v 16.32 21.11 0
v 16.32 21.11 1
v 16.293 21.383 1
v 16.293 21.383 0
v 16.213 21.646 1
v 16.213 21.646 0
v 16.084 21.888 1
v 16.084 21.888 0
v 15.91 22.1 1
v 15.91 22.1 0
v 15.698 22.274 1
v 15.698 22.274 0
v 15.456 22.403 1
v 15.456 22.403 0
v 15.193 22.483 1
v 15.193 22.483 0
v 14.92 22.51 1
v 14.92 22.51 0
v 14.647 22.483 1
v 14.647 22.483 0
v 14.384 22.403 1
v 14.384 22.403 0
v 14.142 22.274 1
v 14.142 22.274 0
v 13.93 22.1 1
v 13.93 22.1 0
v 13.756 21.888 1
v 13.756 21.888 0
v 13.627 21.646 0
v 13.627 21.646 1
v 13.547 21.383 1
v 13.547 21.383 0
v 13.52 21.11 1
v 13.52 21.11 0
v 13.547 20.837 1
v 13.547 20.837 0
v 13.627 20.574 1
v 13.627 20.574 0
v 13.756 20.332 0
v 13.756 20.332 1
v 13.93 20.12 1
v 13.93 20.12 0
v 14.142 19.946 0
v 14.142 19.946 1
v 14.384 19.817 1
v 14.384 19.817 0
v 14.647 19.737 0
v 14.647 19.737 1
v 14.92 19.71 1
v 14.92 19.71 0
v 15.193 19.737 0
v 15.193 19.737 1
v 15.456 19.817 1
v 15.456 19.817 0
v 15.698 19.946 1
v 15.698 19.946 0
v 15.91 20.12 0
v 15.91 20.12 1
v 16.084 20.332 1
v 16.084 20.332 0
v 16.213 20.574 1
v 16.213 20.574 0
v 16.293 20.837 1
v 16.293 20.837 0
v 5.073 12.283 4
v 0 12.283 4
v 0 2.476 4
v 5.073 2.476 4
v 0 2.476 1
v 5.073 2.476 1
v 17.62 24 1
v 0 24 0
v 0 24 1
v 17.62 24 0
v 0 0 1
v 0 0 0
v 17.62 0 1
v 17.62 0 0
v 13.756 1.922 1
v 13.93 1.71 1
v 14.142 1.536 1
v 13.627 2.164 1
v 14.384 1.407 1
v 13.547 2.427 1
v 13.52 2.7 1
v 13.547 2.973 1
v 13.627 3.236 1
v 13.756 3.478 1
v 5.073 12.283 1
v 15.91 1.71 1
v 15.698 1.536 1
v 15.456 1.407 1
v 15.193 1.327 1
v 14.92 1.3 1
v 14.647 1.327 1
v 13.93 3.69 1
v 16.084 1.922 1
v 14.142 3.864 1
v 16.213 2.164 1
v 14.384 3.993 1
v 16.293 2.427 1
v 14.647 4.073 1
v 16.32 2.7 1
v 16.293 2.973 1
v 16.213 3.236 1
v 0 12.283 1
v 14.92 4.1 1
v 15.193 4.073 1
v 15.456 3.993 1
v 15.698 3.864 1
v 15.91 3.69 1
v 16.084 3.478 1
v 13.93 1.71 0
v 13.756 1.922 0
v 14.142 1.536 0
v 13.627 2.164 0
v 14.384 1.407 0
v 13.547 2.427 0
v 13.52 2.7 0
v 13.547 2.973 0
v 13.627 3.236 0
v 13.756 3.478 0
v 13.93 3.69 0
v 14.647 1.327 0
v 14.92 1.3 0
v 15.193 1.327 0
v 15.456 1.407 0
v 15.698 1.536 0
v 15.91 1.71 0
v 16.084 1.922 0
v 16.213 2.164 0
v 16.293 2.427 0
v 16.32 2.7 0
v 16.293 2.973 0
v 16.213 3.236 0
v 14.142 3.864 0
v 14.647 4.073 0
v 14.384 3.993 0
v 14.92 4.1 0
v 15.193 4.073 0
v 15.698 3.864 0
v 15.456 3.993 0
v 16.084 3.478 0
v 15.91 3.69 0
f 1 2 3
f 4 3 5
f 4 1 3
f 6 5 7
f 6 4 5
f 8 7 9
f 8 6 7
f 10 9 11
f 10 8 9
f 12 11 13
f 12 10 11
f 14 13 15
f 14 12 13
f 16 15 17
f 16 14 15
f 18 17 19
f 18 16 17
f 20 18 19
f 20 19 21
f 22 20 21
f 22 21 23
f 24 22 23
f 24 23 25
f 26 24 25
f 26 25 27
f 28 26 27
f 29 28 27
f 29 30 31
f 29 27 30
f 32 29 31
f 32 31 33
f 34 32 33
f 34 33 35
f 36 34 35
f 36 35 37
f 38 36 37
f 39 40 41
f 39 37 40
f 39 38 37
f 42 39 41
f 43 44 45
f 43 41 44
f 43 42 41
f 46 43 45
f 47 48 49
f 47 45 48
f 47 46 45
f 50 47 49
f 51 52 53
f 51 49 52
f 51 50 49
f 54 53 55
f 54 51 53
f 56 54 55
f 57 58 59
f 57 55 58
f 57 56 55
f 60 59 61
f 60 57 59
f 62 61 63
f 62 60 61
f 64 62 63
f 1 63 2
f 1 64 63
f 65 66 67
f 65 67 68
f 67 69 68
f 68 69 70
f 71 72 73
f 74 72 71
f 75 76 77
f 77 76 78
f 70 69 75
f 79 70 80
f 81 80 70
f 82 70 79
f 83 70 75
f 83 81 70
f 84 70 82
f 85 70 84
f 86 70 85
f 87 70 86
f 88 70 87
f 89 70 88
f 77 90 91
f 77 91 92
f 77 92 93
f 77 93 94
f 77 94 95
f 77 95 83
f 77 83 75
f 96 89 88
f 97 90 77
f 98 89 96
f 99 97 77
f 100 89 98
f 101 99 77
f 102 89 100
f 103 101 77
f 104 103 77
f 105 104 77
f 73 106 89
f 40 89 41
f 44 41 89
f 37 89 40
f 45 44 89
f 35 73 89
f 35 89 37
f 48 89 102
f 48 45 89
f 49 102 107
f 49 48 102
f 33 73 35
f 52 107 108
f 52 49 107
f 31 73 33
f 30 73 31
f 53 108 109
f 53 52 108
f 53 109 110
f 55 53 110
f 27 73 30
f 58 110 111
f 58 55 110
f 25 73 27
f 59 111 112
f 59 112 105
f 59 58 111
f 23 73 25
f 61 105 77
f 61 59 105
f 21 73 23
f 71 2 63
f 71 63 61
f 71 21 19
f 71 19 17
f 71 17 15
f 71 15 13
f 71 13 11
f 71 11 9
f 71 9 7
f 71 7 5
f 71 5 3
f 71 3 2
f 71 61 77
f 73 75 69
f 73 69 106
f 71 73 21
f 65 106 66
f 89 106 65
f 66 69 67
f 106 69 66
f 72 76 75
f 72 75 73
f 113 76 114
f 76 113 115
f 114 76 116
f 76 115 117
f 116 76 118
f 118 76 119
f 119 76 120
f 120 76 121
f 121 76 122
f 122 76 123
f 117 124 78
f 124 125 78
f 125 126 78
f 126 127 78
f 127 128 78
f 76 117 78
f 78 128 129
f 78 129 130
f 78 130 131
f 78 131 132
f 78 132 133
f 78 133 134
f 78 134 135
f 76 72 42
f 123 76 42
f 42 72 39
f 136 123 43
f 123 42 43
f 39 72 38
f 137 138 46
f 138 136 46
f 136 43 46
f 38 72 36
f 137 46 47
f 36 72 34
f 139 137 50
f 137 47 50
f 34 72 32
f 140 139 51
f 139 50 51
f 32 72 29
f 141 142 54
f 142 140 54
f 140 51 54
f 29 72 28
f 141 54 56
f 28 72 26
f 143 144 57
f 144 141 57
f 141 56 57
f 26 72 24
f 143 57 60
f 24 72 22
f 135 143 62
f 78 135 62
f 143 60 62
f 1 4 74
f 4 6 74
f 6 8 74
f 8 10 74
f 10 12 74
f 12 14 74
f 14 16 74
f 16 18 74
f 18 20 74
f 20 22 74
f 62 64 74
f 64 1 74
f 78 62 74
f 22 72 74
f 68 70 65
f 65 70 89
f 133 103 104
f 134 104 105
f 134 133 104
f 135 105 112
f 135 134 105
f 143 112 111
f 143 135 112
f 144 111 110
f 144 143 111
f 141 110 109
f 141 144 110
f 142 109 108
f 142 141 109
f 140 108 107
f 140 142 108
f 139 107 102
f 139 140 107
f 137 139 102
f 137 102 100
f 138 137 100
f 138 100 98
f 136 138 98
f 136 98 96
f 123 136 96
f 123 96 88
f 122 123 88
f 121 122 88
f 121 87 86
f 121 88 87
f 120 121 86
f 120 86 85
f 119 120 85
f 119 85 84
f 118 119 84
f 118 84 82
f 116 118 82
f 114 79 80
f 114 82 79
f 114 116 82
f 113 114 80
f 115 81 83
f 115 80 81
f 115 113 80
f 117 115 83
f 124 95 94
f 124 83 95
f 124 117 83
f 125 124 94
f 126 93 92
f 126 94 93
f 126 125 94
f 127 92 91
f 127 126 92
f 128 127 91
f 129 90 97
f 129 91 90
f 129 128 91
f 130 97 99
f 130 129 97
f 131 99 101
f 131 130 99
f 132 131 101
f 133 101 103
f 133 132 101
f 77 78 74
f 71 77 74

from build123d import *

# Parameters (mm, degrees)
F0_W     = 17.62
F0_H     = 24
F2_DEPTH = 1
F1_R     = 1.4
F3_DEPTH = 3
F4_W     = 5.072871
F4_H     = 9.807147
F5_DEPTH = 3


with BuildPart() as f2:
    # F0 (on Top) → F2 (new body)
    with BuildSketch(Plane.XY):
        with Locations((8.81, 12)):
            Rectangle(F0_W, F0_H)
    extrude(amount=F2_DEPTH)

    # F1 (on face) → F3 (cut)
    with BuildSketch(Plane.XY):
        with Locations((14.92, 2.7)):
            Circle(F1_R)
        with Locations((14.92, 21.11)):
            Circle(F1_R)
    extrude(amount=F3_DEPTH, mode=Mode.SUBTRACT)

    # F4 (on face) → F5 (join)
    with BuildSketch(Plane.XY.offset(1)):
        with Locations((2.536436, 7.37925)):
            Rectangle(F4_W, F4_H)
    extrude(amount=F5_DEPTH)


solid = f2.part
